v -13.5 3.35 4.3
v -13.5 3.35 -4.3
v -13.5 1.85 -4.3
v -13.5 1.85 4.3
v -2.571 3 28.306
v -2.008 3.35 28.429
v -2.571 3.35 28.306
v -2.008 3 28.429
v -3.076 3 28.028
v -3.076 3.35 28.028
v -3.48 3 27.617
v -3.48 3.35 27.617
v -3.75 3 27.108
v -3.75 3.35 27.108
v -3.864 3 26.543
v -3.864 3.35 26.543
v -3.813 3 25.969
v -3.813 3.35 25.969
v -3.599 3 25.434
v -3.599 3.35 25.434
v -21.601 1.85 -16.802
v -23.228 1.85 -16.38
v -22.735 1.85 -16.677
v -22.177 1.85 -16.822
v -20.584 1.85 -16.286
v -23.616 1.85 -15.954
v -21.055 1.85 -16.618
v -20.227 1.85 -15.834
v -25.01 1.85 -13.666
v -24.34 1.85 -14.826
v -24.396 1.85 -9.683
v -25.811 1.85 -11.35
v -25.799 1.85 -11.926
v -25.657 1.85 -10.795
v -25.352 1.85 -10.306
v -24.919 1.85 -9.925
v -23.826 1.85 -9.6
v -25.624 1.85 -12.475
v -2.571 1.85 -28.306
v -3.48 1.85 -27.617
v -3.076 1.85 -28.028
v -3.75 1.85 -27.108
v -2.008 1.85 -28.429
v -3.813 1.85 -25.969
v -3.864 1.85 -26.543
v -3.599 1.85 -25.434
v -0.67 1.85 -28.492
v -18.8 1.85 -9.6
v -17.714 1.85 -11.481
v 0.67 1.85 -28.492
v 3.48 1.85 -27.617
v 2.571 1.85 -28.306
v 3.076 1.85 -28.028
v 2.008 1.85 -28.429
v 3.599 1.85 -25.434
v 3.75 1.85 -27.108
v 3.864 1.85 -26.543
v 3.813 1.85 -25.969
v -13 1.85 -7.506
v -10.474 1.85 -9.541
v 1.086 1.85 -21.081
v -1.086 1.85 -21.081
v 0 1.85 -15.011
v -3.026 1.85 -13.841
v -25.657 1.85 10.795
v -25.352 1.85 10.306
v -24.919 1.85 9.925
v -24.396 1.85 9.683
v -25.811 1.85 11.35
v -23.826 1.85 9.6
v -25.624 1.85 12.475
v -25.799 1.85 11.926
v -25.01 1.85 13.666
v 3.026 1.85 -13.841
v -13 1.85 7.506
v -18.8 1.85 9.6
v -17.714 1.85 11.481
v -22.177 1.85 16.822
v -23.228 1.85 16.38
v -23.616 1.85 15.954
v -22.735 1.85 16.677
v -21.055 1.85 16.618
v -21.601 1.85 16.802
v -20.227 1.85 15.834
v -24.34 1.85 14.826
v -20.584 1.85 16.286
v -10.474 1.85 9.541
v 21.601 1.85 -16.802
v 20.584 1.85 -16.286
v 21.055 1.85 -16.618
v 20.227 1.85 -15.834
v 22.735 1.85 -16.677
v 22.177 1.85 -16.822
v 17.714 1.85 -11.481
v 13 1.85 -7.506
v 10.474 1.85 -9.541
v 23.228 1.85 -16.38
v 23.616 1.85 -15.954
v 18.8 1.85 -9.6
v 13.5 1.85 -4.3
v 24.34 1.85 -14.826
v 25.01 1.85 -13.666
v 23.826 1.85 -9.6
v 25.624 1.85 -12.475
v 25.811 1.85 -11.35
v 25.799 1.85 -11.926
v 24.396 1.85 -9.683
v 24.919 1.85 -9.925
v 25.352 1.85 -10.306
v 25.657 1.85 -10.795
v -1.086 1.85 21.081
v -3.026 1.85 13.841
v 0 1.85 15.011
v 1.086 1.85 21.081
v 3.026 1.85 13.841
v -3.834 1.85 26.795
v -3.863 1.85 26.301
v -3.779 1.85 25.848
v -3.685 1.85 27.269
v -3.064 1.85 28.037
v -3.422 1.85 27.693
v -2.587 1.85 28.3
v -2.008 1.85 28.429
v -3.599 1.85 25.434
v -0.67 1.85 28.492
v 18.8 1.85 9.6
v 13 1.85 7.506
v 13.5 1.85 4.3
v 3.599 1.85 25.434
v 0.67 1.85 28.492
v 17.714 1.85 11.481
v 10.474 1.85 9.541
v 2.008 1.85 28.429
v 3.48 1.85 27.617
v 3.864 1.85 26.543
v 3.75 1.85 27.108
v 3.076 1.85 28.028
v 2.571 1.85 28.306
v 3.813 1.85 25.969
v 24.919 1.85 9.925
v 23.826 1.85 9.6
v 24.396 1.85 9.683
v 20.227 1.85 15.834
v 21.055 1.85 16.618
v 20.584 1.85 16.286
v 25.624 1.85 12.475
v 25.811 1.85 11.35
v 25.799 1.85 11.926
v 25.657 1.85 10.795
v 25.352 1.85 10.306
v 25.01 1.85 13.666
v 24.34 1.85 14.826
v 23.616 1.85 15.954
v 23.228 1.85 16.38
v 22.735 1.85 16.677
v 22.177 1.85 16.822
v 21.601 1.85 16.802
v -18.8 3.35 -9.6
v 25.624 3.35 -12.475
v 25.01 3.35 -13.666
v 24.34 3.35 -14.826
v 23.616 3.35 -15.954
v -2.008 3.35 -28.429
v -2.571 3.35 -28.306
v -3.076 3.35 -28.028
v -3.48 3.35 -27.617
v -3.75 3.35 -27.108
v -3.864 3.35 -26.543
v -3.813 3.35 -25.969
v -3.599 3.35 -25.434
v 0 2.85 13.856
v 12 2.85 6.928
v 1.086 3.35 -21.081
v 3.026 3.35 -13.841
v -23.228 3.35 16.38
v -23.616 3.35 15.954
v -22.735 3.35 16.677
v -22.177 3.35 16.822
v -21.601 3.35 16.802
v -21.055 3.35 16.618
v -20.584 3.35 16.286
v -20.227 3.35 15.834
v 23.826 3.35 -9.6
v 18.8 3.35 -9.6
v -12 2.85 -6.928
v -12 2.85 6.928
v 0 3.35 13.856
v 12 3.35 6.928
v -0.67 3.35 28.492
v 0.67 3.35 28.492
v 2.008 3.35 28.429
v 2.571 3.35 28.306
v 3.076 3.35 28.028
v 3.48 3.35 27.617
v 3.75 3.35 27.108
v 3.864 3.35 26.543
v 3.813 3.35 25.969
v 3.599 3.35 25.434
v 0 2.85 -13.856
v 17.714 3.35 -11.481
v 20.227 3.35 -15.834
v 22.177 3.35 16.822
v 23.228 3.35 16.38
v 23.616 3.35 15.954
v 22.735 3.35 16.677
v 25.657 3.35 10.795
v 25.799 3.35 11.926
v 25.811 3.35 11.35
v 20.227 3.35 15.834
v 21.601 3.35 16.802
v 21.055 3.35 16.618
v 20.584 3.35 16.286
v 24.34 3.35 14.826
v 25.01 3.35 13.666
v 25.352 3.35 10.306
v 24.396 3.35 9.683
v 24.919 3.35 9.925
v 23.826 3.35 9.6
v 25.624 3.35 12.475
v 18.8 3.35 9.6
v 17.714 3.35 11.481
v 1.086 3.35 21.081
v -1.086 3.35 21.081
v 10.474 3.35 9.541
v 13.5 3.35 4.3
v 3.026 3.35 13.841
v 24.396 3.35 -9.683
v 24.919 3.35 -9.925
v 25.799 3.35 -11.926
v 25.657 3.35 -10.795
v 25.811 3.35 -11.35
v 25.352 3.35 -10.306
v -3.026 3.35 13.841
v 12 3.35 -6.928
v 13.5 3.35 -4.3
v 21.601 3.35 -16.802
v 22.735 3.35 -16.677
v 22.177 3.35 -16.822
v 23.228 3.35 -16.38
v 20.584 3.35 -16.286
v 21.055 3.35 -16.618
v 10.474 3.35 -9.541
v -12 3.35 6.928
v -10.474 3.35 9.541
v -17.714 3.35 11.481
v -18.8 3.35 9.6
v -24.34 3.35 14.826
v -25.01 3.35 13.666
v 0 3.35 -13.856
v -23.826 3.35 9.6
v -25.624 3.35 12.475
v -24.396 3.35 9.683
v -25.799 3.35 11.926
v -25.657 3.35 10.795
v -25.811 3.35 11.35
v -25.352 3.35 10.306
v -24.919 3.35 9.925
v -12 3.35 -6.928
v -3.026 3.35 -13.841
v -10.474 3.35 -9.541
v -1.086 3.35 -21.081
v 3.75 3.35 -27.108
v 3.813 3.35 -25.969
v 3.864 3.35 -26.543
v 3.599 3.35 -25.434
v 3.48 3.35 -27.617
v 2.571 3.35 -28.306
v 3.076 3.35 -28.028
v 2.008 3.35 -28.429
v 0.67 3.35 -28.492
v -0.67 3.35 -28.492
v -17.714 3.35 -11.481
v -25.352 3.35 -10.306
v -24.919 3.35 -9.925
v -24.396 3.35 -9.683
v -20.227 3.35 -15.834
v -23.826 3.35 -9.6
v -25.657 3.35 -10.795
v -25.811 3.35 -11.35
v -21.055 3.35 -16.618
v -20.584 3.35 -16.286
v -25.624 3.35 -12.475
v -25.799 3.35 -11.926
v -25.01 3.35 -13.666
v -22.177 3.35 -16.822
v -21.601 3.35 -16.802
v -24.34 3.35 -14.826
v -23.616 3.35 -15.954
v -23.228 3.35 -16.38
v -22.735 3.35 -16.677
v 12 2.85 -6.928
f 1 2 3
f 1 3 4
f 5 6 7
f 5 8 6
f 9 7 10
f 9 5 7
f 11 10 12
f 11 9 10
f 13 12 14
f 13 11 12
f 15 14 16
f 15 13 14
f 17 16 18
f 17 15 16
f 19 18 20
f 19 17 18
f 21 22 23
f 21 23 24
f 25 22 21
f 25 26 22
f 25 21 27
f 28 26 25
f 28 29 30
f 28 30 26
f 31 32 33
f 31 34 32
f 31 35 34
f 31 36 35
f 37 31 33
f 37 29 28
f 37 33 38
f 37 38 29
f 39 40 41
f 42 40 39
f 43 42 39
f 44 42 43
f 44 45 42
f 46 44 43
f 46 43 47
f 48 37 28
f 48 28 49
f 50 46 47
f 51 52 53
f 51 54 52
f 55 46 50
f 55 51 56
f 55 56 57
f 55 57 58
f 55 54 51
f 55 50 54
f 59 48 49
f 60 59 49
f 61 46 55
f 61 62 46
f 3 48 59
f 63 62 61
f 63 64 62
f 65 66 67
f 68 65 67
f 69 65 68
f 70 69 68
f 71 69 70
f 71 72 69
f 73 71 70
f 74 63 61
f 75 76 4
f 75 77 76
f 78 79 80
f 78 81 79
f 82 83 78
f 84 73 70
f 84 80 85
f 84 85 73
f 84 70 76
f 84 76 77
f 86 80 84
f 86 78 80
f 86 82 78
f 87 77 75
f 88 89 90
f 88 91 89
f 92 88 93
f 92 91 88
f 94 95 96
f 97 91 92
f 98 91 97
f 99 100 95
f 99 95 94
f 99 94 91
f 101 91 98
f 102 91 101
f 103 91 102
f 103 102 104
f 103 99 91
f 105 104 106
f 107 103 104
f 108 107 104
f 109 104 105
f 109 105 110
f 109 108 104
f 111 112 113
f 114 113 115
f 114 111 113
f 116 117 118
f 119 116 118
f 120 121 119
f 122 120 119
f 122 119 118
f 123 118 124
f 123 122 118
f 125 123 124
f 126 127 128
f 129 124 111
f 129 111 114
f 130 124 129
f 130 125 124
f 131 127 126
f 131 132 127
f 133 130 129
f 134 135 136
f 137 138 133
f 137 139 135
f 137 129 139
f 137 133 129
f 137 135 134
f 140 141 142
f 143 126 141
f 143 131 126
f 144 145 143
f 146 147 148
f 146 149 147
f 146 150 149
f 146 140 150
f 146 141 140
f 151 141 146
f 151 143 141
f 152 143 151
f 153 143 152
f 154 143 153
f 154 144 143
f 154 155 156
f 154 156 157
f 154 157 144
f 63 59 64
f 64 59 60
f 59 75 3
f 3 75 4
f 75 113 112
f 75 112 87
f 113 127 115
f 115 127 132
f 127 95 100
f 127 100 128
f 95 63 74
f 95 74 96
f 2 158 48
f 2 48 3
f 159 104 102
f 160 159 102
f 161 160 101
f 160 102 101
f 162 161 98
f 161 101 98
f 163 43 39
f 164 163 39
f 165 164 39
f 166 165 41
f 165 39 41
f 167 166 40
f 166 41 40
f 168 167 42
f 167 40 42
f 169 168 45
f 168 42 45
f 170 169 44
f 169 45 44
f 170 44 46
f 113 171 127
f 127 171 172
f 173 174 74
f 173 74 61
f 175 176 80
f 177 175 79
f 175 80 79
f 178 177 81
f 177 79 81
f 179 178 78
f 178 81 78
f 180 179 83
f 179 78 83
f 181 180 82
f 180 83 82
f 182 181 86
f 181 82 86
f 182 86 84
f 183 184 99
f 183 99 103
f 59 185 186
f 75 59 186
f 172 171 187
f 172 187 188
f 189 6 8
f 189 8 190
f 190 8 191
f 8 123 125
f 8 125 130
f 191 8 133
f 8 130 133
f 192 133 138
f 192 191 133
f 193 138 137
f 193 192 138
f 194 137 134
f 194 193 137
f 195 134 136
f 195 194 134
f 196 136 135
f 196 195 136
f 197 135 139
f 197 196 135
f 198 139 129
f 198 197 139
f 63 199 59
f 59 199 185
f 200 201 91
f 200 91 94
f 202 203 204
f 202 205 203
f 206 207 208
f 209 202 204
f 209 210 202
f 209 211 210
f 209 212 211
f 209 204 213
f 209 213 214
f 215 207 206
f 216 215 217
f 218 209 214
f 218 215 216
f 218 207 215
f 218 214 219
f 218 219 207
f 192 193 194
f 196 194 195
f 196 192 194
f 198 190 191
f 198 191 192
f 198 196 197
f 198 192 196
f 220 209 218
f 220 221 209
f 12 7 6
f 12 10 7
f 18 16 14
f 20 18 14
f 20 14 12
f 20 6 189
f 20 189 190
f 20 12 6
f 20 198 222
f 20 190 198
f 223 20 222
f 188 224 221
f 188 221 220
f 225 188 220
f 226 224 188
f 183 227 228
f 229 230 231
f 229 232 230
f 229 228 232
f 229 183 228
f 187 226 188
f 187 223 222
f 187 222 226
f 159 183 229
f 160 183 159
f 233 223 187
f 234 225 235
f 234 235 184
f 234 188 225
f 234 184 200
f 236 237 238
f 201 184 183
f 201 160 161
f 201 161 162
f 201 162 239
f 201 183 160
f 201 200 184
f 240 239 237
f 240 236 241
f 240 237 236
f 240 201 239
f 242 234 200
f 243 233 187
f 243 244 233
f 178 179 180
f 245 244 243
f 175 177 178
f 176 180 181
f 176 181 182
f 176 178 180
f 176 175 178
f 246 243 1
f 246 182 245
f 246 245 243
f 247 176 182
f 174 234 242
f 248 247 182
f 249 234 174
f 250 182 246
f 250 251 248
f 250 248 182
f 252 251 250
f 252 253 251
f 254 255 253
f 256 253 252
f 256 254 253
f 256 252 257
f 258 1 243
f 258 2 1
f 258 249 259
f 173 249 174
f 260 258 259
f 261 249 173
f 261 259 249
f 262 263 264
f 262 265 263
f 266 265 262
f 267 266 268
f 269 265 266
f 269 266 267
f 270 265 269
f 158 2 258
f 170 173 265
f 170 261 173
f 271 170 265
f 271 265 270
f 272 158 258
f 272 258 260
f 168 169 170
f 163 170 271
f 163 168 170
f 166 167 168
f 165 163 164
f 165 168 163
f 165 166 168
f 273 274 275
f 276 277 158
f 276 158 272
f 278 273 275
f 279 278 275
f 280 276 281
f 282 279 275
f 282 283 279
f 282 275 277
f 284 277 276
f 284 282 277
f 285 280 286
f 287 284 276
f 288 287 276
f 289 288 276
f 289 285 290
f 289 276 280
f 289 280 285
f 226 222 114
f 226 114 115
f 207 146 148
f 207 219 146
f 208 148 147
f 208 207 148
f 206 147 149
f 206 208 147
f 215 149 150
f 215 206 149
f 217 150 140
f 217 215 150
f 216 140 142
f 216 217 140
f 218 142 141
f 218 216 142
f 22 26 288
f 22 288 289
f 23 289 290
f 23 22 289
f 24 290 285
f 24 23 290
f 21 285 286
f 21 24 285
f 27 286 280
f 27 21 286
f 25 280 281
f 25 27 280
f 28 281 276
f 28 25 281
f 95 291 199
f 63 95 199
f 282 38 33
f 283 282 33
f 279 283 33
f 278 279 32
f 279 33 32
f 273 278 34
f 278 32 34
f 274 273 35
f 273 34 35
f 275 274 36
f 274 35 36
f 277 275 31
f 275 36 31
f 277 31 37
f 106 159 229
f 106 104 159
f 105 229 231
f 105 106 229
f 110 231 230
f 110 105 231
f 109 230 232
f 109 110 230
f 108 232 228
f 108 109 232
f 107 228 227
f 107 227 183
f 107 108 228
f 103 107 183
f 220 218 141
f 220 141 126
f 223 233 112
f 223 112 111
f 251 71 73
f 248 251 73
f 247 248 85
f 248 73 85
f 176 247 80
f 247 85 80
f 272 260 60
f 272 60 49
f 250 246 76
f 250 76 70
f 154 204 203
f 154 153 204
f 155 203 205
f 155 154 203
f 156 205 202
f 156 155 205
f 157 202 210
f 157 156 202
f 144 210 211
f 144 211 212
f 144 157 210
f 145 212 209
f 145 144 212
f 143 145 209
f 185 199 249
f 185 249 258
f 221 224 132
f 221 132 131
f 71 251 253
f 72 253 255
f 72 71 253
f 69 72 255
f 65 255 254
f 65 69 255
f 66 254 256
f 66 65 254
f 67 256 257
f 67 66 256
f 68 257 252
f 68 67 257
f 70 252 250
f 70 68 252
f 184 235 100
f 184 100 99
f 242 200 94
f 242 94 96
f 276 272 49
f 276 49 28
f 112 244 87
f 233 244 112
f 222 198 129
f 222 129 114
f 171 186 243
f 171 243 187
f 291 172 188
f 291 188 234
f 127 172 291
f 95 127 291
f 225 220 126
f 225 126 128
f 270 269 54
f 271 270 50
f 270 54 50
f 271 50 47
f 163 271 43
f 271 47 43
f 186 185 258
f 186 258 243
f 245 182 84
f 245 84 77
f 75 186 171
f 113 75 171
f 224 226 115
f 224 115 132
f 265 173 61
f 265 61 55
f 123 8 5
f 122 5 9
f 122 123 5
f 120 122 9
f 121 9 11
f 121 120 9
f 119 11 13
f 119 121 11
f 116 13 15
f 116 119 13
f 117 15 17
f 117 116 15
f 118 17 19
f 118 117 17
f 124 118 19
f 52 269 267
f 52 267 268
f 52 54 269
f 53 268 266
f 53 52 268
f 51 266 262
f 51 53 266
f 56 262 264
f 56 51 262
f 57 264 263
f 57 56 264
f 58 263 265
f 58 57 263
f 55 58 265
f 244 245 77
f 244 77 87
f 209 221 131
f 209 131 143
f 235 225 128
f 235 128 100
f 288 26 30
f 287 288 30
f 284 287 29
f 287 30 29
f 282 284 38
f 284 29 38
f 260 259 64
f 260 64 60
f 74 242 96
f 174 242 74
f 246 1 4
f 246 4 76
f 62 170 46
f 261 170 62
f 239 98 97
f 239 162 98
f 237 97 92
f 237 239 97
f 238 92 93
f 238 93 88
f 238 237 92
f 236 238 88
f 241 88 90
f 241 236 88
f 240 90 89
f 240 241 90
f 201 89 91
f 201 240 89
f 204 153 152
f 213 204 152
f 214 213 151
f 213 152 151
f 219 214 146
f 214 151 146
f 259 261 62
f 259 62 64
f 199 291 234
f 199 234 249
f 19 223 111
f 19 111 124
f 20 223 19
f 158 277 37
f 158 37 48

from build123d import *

# Parameters (mm, degrees)
SKETCH1_R               = 28.5
SKETCH1_R_2             = 12.7
BOSS_EXTRUDE1_DEPTH     = 2
SKETCH2_R               = 28.5
BOSS_EXTRUDE2_DEPTH     = 1
SKETCH3_R               = 11
BOSS_EXTRUDE3_DEPTH     = 7
CUT_EXTRUDE1_DEPTH      = 42.527099586
CUT_EXTRUDE1_DEPTH_BACK = 42.527099586
SKETCH4_R               = 9.65
SKETCH5_R               = 11
SKETCH5_R_2             = 8
BOSS_EXTRUDE4_DEPTH     = 5
SKETCH6_R               = 12.7
SKETCH6_R_2             = 9.65
BOSS_EXTRUDE5_DEPTH     = 2
SKETCH13_R              = 28.5
CUT_EXTRUDE2_DEPTH      = 1
SKETCH12_W              = 2
SKETCH12_H              = 4
BOSS_EXTRUDE7_DEPTH     = 2
FILLET1_R               = 0.5
SKETCH14_R              = 28.5
SKETCH14_R_2            = 11
BOSS_EXTRUDE8_DEPTH     = 0.35
BOSS_EXTRUDE9_START     = 11.65
SKETCH15_R              = 9.65
BOSS_EXTRUDE9_DEPTH     = 11.65
CUT_EXTRUDE3_DEPTH      = 1.5
CHAMFER1_SIZE           = 1
FILLET2_R               = 2
SKETCH17_R              = 9.67
CUT_EXTRUDE4_DEPTH      = 9
CIRPATTERN1_COUNT       = 2
CIRPATTERN1_ANGLE       = 30
SKETCH18_W              = 2.800280384
SKETCH18_H              = 4.910480866
SKETCH18_W_2            = 2.857294562
SKETCH18_H_2            = 5.674760566
CUT_EXTRUDE5_DEPTH      = 10
SKETCH19_R              = 28.5
CUT_EXTRUDE6_DEPTH      = 0.85
FILLET3_R               = 0.5
SKETCH20_R              = 68.647150441
CUT_EXTRUDE7_DEPTH      = 0.7
CUT_EXTRUDE8_DEPTH      = 41.186658172
CUT_EXTRUDE8_DEPTH_BACK = 41.186658172
CUT_EXTRUDE9_START      = 10
CUT_EXTRUDE9_DEPTH      = 10
CHAMFER2_SIZE           = 1


with BuildPart() as part:
    # Sketch1 → Boss-Extrude1 (new body)
    with BuildSketch(Plane(origin=(0, 0, 0), x_dir=(1, 0, 0), z_dir=(0, 1, 0))):
        with Locations(Location((0, 0, 0), (0, 0, 270))):
            Circle(SKETCH1_R)
        with Locations(Location((0, 0, 0), (0, 0, 270))):
            Circle(SKETCH1_R_2, mode=Mode.SUBTRACT)
    extrude(amount=BOSS_EXTRUDE1_DEPTH)

    # Sketch2 → Boss-Extrude2 (add)
    with BuildSketch(Plane(origin=(0, 2, 0), x_dir=(1, 0, 0), z_dir=(0, 1, 0))):
        with Locations(Location((0, 0, 0), (0, 0, 270))):
            Circle(SKETCH2_R)
    extrude(amount=BOSS_EXTRUDE2_DEPTH)

    # Sketch3 → Boss-Extrude3 (add)
    with BuildSketch(Plane(origin=(0, 3, 0), x_dir=(1, 0, 0), z_dir=(0, 1, 0))):
        with Locations(Location((0, 0, 0), (0, 0, 270))):
            Circle(SKETCH3_R)
    extrude(amount=BOSS_EXTRUDE3_DEPTH)

    # Sketch4 → Cut-Extrude1 (cut, two sides: drawn at the far end of the back side and taken through both)
    with BuildSketch(Plane(origin=(0, 10, 0), x_dir=(1, 0, 0), z_dir=(0, 1, 0)).offset(-CUT_EXTRUDE1_DEPTH_BACK)):
        with Locations(Location((0, 0, 0), (0, 0, 270))):
            Circle(SKETCH4_R)
    extrude(amount=CUT_EXTRUDE1_DEPTH + CUT_EXTRUDE1_DEPTH_BACK, mode=Mode.SUBTRACT)

    # Sketch5 → Boss-Extrude4 (add)
    with BuildSketch(Plane(origin=(0, 10, 0), x_dir=(1, 0, 0), z_dir=(0, 1, 0))):
        with Locations(Location((0, 0, 0), (0, 0, 270))):
            Circle(SKETCH5_R)
        with Locations(Location((0, 0, 0), (0, 0, 270))):
            Circle(SKETCH5_R_2, mode=Mode.SUBTRACT)
    extrude(amount=BOSS_EXTRUDE4_DEPTH)

    # Sketch6 → Boss-Extrude5 (add)
    with BuildSketch(Plane.XZ.offset(-2)):
        Circle(SKETCH6_R)
        with Locations(Location((0, 0, 0), (0, 0, 90))):
            Circle(SKETCH6_R_2, mode=Mode.SUBTRACT)
    extrude(amount=BOSS_EXTRUDE5_DEPTH)

    # Sketch13 → Cut-Extrude2 (cut)
    with BuildSketch(Plane.XZ):
        with Locations(Location((0, 0, 0), (0, 0, 270))):
            Circle(SKETCH13_R)
    extrude(amount=-CUT_EXTRUDE2_DEPTH, mode=Mode.SUBTRACT)

    # Sketch12 → Boss-Extrude7 (add)
    with BuildSketch(Plane.XZ.offset(-1)):
        with Locations((25.5, 0)):
            Rectangle(SKETCH12_W, SKETCH12_H)
        with Locations((-25.5, 0)):
            Rectangle(SKETCH12_W, SKETCH12_H)
    boss_extrude7 = extrude(amount=BOSS_EXTRUDE7_DEPTH)

    # Fillet1
    fillet1_edges = [part.edges().sort_by_distance(p)[0] for p in [
        (24.5, 0, 2),
        (24.5, 0, -2),
        (26.5, 0, -2),
        (26.5, 0, 2),
        (-24.5, 0, -2),
        (-24.5, 0, 2),
        (-26.5, 0, 2),
        (-26.5, 0, -2),
    ]]
    fillet(fillet1_edges, radius=FILLET1_R)

    # Sketch14 → Boss-Extrude8 (add)
    with BuildSketch(Plane(origin=(0, 3, 0), x_dir=(1, 0, 0), z_dir=(0, 1, 0))):
        with Locations(Location((0, 0, 0), (0, 0, 90))):
            Circle(SKETCH14_R)
        with Locations(Location((0, 0, 0), (0, 0, 270))):
            Circle(SKETCH14_R_2, mode=Mode.SUBTRACT)
    extrude(amount=BOSS_EXTRUDE8_DEPTH)

    # Sketch15 → Boss-Extrude9 (add)
    with BuildSketch(Plane(origin=(0, 3.35, 0), x_dir=(1, 0, 0), z_dir=(0, 1, 0)).offset(BOSS_EXTRUDE9_START)):
        Polygon((0, -12.990381057), (11.25, -6.495190528), (11.25, 6.495190528), (0, 12.990381057), (-11.25, 6.495190528), (-11.25, -6.495190528), align=None)
        with Locations(Location((0, 0, 0), (0, 0, 270))):
            Circle(SKETCH15_R, mode=Mode.SUBTRACT)
    extrude(amount=-BOSS_EXTRUDE9_DEPTH)

    # Sketch16 → Cut-Extrude3 (cut)
    with BuildSketch(Plane(origin=(0, 3.35, 0), x_dir=(1, 0, 0), z_dir=(0, 1, 0))):
        Polygon((-6.186156124, -29.91473671), (-22.813843876, -20.31473671), (-17.713843876, -11.481277591), (-10.473909236, -9.541342951), (-3.026090764, -13.841342951), (-1.086156124, -21.081277591), align=None)
        Polygon((-13.5, -4.3), (-18.8, -9.6), (-29, -9.6), (-29, 9.6), (-18.8, 9.6), (-13.5, 4.3), align=None)
        Polygon((-10.473909236, 9.541342951), (-17.713843876, 11.481277591), (-22.813843876, 20.31473671), (-6.186156124, 29.91473671), (-1.086156124, 21.081277591), (-3.026090764, 13.841342951), align=None)
        Polygon((3.026090764, 13.841342951), (1.086156124, 21.081277591), (6.186156124, 29.91473671), (22.813843876, 20.31473671), (17.713843876, 11.481277591), (10.473909236, 9.541342951), align=None)
        Polygon((13.5, 4.3), (18.8, 9.6), (29, 9.6), (29, -9.6), (18.8, -9.6), (13.5, -4.3), align=None)
        Polygon((10.473909236, -9.541342951), (17.713843876, -11.481277591), (22.813843876, -20.31473671), (6.186156124, -29.91473671), (1.086156124, -21.081277591), (3.026090764, -13.841342951), align=None)
    extrude(amount=-CUT_EXTRUDE3_DEPTH, mode=Mode.SUBTRACT)

    # Chamfer1
    chamfer1_edges = [part.edges().sort_by_distance(p)[0] for p in [
        (0, 10, -8),
    ]]
    chamfer(chamfer1_edges, length=CHAMFER1_SIZE)

    # Fillet2
    fillet2_edges = [part.edges().sort_by_distance(p)[0] for p in [
        (-21.731090241, 2.425, 18.439352401),
        (-5.103402488, 2.425, 28.039352401),
        (21.731090241, 2.6, 18.439352401),
        (5.103402488, 2.6, 28.039352401),
        (5.103402488, 2.6, -28.039352401),
        (21.731090241, 2.6, -18.439352401),
        (26.834492729, 2.6, -9.6),
        (26.834492729, 2.6, 9.6),
        (-26.834492729, 2.425, 9.6),
        (-26.834492729, 2.425, -9.6),
        (-21.731090241, 2.425, -18.439352401),
        (-5.103402488, 2.425, -28.039352401),
    ]]
    fillet(fillet2_edges, radius=FILLET2_R)

    # Sketch17 → Cut-Extrude4 (cut)
    with BuildSketch(Plane.XZ.offset(-1)):
        with Locations(Location((0, 0, 0), (0, 0, 270))):
            Circle(SKETCH17_R)
    extrude(amount=-CUT_EXTRUDE4_DEPTH, mode=Mode.SUBTRACT)

    # CirPattern1: Boss-Extrude7 ×2 about axis
    cirpattern1_axis = Axis((0, 0, 0), (0, -1, 0))
    for i in range(1, CIRPATTERN1_COUNT):
        add(boss_extrude7.rotate(cirpattern1_axis, i * CIRPATTERN1_ANGLE / (CIRPATTERN1_COUNT - 1)))

    # Sketch18 → Cut-Extrude5 (cut)
    with BuildSketch(Plane.XZ.offset(-1)):
        with Locations((-25.5, 0)):
            Rectangle(SKETCH18_W, SKETCH18_H)
        with Locations((25.5, 0)):
            Rectangle(SKETCH18_W_2, SKETCH18_H_2)
    extrude(amount=CUT_EXTRUDE5_DEPTH, mode=Mode.SUBTRACT)

    # Sketch19 → Cut-Extrude6 (cut)
    with BuildSketch(Plane.XZ.offset(-1)):
        Circle(SKETCH19_R)
        Polygon((21.9496732, 14.982050808), (20.217622393, 13.982050808), (22.217622393, 10.517949192), (23.9496732, 11.517949192), align=None, mode=Mode.SUBTRACT)
        Polygon((-23.9496732, -11.517949192), (-21.9496732, -14.982050808), (-20.217622393, -13.982050808), (-22.217622393, -10.517949192), align=None, mode=Mode.SUBTRACT)
    extrude(amount=-CUT_EXTRUDE6_DEPTH, mode=Mode.SUBTRACT)

    # Fillet3
    fillet3_edges = [part.edges().sort_by_distance(p)[0] for p in [
        (20.217622393, 0.425, 13.982050808),
        (22.217622393, 0.425, 10.517949192),
        (23.9496732, 0.425, 11.517949192),
        (21.9496732, 0.425, 14.982050808),
        (-20.217622393, 0.425, -13.982050808),
        (-22.217622393, 0.425, -10.517949192),
        (-23.9496732, 0.425, -11.517949192),
        (-21.9496732, 0.425, -14.982050808),
    ]]
    fillet(fillet3_edges, radius=FILLET3_R)

    # Sketch20 → Cut-Extrude7 (cut)
    with BuildSketch(Plane.XZ.offset(1)):
        Circle(SKETCH20_R)
    extrude(amount=-CUT_EXTRUDE7_DEPTH, mode=Mode.SUBTRACT)

    # Sketch21 → Cut-Extrude8 (cut, two sides: drawn at the far end of the back side and taken through both)
    with BuildSketch(Plane(origin=(0, 3.35, 0), x_dir=(1, 0, 0), z_dir=(0, 1, 0)).offset(-CUT_EXTRUDE8_DEPTH_BACK)):
        Polygon((0, 13.856406461), (-12, 6.92820323), (-12, -6.92820323), (0, -13.856406461), (12, -6.92820323), (12, 6.92820323), align=None)
    extrude(amount=CUT_EXTRUDE8_DEPTH + CUT_EXTRUDE8_DEPTH_BACK, mode=Mode.SUBTRACT)

    # Sketch22 → Cut-Extrude9 (cut)
    with BuildSketch(Plane.XZ.offset(-1.85).offset(CUT_EXTRUDE9_START)):
        with BuildLine():
            Line((3.59927914, -25.434134341), (1.086156124, -21.081277591))
            Line((1.086156124, -21.081277591), (3.026090764, -13.841342951))
            Line((3.026090764, -13.841342951), (10.473909236, -9.541342951))
            Line((10.473909236, -9.541342951), (17.713843876, -11.481277591))
            Line((17.713843876, -11.481277591), (20.226966893, -15.834134341))
            ThreePointArc((20.226966893, -15.834134341), (21.88851243, -16.832891206), (23.616302055, -15.95369165))
            ThreePointArc((23.616302055, -15.95369165), (24.681724008, -14.25), (25.62445328, -12.475471698))
            ThreePointArc((25.62445328, -12.475471698), (25.521967619, -10.539562212), (23.826246032, -9.6))
            Line((23.826246032, -9.6), (18.8, -9.6))
            Line((18.8, -9.6), (13.5, -4.3))
            Line((13.5, -4.3), (13.5, 4.3))
            Line((13.5, 4.3), (18.8, 9.6))
            Line((18.8, 9.6), (23.826246032, 9.6))
            ThreePointArc((23.826246032, 9.6), (25.521967619, 10.539562212), (25.62445328, 12.475471698))
            ThreePointArc((25.62445328, 12.475471698), (24.681724008, 14.25), (23.616302055, 15.95369165))
            ThreePointArc((23.616302055, 15.95369165), (21.88851243, 16.832891206), (20.226966893, 15.834134341))
            Line((20.226966893, 15.834134341), (17.713843876, 11.481277591))
            Line((17.713843876, 11.481277591), (10.473909236, 9.541342951))
            Line((10.473909236, 9.541342951), (3.026090764, 13.841342951))
            Line((3.026090764, 13.841342951), (1.086156124, 21.081277591))
            Line((1.086156124, 21.081277591), (3.59927914, 25.434134341))
            ThreePointArc((3.59927914, 25.434134341), (3.633455189, 27.372453418), (2.008151225, 28.429163348))
            ThreePointArc((2.008151225, 28.429163348), (0, 28.5), (-2.008151225, 28.429163348))
            ThreePointArc((-2.008151225, 28.429163348), (-3.633455189, 27.372453418), (-3.59927914, 25.434134341))
            Line((-3.59927914, 25.434134341), (-1.086156124, 21.081277591))
            Line((-1.086156124, 21.081277591), (-3.026090764, 13.841342951))
            Line((-3.026090764, 13.841342951), (-10.473909236, 9.541342951))
            Line((-10.473909236, 9.541342951), (-17.713843876, 11.481277591))
            Line((-17.713843876, 11.481277591), (-20.226966893, 15.834134341))
            ThreePointArc((-20.226966893, 15.834134341), (-21.88851243, 16.832891206), (-23.616302055, 15.95369165))
            ThreePointArc((-23.616302055, 15.95369165), (-24.681724008, 14.25), (-25.62445328, 12.475471698))
            ThreePointArc((-25.62445328, 12.475471698), (-25.521967619, 10.539562212), (-23.826246032, 9.6))
            Line((-23.826246032, 9.6), (-18.8, 9.6))
            Line((-18.8, 9.6), (-13.5, 4.3))
            Line((-13.5, 4.3), (-13.5, -4.3))
            Line((-13.5, -4.3), (-18.8, -9.6))
            Line((-18.8, -9.6), (-23.826246032, -9.6))
            ThreePointArc((-23.826246032, -9.6), (-25.521967619, -10.539562212), (-25.62445328, -12.475471698))
            ThreePointArc((-25.62445328, -12.475471698), (-24.681724008, -14.25), (-23.616302055, -15.95369165))
            ThreePointArc((-23.616302055, -15.95369165), (-21.88851243, -16.832891206), (-20.226966893, -15.834134341))
            Line((-20.226966893, -15.834134341), (-17.713843876, -11.481277591))
            Line((-17.713843876, -11.481277591), (-10.473909236, -9.541342951))
            Line((-10.473909236, -9.541342951), (-3.026090764, -13.841342951))
            Line((-3.026090764, -13.841342951), (-1.086156124, -21.081277591))
            Line((-1.086156124, -21.081277591), (-3.59927914, -25.434134341))
            ThreePointArc((-3.59927914, -25.434134341), (-3.633455189, -27.372453418), (-2.008151225, -28.429163348))
            ThreePointArc((-2.008151225, -28.429163348), (0, -28.5), (2.008151225, -28.429163348))
            ThreePointArc((2.008151225, -28.429163348), (3.633455189, -27.372453418), (3.59927914, -25.434134341))
        make_face()
    extrude(amount=-CUT_EXTRUDE9_DEPTH, mode=Mode.SUBTRACT)

    # Chamfer2
    chamfer2_edges = [part.edges().sort_by_distance(p)[0] for p in [
        (-6, 1.85, -10.392304845),
        (-12, 1.85, 0),
        (-6, 1.85, 10.392304845),
        (6, 1.85, 10.392304845),
        (12, 1.85, 0),
        (6, 1.85, -10.392304845),
    ]]
    chamfer(chamfer2_edges, length=CHAMFER2_SIZE)


solid = part.part
